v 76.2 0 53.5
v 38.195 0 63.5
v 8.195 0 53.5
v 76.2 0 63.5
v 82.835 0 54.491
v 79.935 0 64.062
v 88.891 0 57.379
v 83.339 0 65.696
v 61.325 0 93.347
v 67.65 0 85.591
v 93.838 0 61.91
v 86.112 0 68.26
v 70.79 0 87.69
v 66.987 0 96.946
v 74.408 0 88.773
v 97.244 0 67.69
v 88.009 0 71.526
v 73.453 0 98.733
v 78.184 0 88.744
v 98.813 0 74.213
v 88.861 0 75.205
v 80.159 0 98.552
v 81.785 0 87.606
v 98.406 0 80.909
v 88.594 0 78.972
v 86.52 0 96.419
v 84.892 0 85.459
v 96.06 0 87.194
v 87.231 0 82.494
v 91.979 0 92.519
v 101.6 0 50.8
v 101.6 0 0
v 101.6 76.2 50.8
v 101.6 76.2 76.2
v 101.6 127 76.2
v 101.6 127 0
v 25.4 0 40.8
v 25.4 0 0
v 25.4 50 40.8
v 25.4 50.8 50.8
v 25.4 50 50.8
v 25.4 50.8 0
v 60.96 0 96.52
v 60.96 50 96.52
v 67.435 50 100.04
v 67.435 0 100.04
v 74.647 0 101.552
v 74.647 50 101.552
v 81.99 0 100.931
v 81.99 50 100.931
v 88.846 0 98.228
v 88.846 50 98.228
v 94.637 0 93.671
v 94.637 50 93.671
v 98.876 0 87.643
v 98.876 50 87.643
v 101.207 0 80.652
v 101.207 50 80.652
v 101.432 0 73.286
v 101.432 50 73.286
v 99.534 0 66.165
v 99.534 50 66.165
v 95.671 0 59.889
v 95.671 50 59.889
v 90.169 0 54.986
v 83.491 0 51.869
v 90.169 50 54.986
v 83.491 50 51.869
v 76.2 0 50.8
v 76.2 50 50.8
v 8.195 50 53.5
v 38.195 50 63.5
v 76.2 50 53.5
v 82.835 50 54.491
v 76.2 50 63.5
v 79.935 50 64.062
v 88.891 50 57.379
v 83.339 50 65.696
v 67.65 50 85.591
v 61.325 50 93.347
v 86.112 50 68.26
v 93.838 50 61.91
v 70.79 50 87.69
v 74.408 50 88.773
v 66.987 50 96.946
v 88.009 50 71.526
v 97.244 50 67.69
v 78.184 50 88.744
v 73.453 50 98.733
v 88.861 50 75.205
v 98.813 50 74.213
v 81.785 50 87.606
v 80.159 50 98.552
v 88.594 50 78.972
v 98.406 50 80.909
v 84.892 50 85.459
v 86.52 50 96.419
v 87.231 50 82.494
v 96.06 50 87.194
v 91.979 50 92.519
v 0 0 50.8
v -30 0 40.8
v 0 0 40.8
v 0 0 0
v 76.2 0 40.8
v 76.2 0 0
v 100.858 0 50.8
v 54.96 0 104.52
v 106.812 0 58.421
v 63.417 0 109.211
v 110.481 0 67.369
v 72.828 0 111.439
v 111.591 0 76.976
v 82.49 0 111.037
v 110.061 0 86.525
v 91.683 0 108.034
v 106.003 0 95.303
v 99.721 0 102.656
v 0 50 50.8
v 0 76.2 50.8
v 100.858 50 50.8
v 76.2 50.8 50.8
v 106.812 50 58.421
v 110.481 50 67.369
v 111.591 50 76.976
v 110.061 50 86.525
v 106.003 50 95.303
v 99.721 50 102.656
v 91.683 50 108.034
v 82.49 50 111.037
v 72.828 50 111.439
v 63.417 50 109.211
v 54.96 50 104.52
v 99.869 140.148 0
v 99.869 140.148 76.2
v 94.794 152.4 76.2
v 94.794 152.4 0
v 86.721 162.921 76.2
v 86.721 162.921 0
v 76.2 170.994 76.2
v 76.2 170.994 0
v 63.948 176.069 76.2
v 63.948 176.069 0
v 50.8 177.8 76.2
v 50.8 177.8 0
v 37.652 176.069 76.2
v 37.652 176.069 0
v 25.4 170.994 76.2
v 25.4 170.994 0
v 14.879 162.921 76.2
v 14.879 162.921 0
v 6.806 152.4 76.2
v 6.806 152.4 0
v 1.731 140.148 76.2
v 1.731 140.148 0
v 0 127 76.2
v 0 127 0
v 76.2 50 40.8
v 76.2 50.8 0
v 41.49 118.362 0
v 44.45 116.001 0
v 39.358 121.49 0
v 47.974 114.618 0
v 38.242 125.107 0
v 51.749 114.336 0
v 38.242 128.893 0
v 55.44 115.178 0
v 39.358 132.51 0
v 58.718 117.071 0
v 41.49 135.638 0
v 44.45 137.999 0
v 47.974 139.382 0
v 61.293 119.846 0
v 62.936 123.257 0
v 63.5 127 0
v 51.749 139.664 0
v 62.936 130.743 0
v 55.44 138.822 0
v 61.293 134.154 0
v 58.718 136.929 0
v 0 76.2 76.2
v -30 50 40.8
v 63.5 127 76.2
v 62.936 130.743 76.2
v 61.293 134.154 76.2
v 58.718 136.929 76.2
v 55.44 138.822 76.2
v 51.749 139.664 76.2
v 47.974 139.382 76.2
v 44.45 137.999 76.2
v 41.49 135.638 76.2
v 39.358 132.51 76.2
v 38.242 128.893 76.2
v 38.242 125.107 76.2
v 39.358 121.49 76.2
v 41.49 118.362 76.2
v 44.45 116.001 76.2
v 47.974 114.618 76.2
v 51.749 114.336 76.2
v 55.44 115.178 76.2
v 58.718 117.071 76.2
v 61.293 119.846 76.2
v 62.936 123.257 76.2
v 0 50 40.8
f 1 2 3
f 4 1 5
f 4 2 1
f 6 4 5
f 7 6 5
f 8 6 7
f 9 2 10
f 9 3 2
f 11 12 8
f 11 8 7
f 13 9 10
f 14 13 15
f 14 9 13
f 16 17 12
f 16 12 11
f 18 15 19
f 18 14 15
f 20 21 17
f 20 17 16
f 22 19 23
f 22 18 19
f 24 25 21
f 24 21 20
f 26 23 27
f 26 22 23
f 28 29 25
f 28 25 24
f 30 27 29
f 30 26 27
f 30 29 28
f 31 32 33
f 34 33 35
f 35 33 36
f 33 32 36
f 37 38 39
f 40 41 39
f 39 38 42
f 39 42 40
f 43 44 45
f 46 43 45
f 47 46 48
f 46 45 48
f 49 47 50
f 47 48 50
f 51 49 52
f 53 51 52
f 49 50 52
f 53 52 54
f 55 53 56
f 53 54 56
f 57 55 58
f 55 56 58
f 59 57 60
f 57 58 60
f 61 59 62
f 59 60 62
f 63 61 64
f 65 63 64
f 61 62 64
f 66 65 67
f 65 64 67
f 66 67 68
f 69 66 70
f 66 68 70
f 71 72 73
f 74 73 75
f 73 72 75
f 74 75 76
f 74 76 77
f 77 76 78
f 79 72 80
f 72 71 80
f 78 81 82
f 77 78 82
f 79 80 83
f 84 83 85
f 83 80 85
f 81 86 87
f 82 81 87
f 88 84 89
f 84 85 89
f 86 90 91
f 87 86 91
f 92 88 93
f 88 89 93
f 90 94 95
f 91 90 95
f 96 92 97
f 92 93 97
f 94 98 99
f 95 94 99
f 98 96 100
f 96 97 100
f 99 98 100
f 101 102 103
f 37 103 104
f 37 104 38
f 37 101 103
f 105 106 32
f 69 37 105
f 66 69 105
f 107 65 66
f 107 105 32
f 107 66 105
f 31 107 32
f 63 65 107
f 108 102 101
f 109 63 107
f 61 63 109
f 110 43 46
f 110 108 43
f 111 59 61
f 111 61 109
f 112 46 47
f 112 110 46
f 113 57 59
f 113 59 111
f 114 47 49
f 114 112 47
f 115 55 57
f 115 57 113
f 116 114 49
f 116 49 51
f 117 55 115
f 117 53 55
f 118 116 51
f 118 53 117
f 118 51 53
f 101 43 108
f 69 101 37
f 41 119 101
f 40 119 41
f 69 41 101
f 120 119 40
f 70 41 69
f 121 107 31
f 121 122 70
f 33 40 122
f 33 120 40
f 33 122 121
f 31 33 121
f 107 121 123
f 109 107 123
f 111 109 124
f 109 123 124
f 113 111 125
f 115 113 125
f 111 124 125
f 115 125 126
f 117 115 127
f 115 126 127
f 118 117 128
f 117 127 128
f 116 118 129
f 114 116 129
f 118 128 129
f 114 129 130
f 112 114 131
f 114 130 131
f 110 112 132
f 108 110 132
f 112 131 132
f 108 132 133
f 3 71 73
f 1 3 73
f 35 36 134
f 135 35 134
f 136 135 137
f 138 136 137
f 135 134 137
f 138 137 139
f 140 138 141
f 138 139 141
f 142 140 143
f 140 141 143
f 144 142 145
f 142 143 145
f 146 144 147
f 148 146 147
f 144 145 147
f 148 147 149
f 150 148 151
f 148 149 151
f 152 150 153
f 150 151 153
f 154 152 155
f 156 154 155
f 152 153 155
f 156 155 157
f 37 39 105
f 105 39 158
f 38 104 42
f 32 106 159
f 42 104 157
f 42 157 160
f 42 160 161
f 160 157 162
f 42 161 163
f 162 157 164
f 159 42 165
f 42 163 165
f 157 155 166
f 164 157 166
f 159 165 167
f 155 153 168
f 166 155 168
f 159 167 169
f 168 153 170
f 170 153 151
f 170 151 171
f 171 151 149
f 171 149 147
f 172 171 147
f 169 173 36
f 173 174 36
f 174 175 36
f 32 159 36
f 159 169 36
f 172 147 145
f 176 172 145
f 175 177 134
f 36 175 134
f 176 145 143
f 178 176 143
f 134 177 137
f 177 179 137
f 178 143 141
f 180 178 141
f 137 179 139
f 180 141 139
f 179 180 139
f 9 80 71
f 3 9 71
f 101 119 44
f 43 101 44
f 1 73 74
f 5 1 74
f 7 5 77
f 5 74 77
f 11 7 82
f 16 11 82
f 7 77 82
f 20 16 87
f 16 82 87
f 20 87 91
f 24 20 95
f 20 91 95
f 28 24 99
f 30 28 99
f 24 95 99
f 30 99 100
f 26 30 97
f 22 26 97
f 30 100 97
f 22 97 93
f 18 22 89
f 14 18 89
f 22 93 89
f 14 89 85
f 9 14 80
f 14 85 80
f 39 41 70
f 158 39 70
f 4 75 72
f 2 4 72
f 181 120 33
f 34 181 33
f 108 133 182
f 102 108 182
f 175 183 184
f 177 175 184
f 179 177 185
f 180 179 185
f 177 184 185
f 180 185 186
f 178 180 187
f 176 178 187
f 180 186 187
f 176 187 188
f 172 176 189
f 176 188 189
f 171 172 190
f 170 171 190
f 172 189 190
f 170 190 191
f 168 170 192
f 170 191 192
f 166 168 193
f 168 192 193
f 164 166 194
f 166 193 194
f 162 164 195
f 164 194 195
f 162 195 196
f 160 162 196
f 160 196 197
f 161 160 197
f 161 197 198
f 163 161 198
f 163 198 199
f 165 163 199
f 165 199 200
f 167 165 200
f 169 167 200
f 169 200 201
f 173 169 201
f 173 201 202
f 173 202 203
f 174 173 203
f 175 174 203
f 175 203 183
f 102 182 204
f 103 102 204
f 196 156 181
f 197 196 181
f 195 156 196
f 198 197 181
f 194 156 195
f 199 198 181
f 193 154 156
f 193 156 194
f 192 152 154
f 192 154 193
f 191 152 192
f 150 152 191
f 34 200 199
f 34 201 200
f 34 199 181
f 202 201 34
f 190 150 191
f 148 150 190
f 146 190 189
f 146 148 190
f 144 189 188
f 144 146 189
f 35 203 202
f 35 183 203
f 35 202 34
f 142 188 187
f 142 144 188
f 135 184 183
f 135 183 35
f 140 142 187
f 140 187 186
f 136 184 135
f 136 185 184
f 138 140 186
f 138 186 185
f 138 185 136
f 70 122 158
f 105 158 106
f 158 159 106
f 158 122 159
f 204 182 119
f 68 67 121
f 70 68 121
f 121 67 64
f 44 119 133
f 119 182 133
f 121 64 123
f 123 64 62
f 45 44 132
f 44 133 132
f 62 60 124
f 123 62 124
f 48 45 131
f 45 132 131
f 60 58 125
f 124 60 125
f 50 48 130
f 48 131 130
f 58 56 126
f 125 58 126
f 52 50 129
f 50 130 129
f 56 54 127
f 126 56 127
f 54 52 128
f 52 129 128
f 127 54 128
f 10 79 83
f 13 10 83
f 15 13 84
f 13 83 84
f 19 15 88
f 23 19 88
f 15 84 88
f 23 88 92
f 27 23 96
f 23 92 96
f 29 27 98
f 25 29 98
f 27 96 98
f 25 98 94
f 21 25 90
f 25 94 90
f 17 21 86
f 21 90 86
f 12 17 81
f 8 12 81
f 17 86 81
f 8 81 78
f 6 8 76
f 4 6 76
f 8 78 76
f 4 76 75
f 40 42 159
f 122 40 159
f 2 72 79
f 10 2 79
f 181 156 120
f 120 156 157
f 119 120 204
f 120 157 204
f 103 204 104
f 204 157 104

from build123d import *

# Parameters (mm, degrees)
BOSS_EXTRUDE2_DEPTH      = 50.8
BOSS_EXTRUDE3_DEPTH      = 25.4
SKETCH4_R                = 12.7
CUT_EXTRUDE2_DEPTH       = 219.499061783
EXTRUDE_THIN14_START     = -50
EXTRUDE_THIN14_OUTLINE_W = 50.8
EXTRUDE_THIN14_OUTLINE_H = 10
EXTRUDE_THIN14_DEPTH     = 50


# Read off the part's stored shape, not the designer's step: Extrude-Thin14
with BuildPart() as part:
    # Sketch1 → Boss-Extrude2 (new body)
    with BuildSketch(Plane.XY):
        with BuildLine():
            Line((0, 127), (0, 0))
            Line((0, 0), (25.4, 0))
            Line((25.4, 0), (25.4, 50.8))
            Line((25.4, 50.8), (76.2, 50.8))
            Line((76.2, 50.8), (76.2, 0))
            Line((76.2, 0), (101.6, 0))
            Line((101.6, 0), (101.6, 127))
            ThreePointArc((101.6, 127), (50.8, 177.8), (0, 127))
        make_face()
    extrude(amount=BOSS_EXTRUDE2_DEPTH)

    # Sketch3 → Boss-Extrude3 (add)
    with BuildSketch(Plane.XY.offset(50.8)):
        with BuildLine():
            Line((0, 127), (0, 76.2))
            Line((0, 76.2), (101.6, 76.2))
            Line((101.6, 76.2), (101.6, 127))
            ThreePointArc((101.6, 127), (50.8, 177.8), (0, 127))
        make_face()
    extrude(amount=BOSS_EXTRUDE3_DEPTH)

    # Sketch4 → Cut-Extrude2 (cut, through all)
    with BuildSketch(Plane.XY.offset(76.2)):
        with Locations((50.8, 127)):
            Circle(SKETCH4_R)
    extrude(amount=-CUT_EXTRUDE2_DEPTH, mode=Mode.SUBTRACT)

    # Extrude-Thin14 outline → Extrude-Thin14 (add)
    # profile 1 of 3: a face of its own
    with BuildSketch(Plane.XZ.offset(EXTRUDE_THIN14_START)):
        with BuildLine():
            Line((8.195486321, 53.5), (76.2, 53.5))
            ThreePointArc((76.2, 53.5), (97.466516312, 84.138846513), (61.324968382, 93.347111546))
            Line((61.324968382, 93.347111546), (8.195486321, 53.5))
        make_face()
        with BuildLine():
            ThreePointArc((67.650406883, 85.591190422), (88.043946098, 80.783769281), (76.2, 63.5))
            Line((76.2, 63.5), (38.195486321, 63.5))
            Line((38.195486321, 63.5), (67.650406883, 85.591190422))
        make_face(mode=Mode.SUBTRACT)
    # profile 2 of 3: a face of its own
    with BuildSketch(Plane.XZ.offset(EXTRUDE_THIN14_START)):
        with BuildLine():
            Line((76.2, 50.8), (100.857656012, 50.8))
            ThreePointArc((100.857656012, 50.8), (103.114302762, 99.195223566), (54.96, 104.52))
            Line((54.96, 104.52), (-30, 40.8))
            Line((-30, 40.8), (0, 40.8))
            Line((0, 40.8), (0, 50.8))
            Line((0, 50.8), (60.96, 96.52))
            ThreePointArc((60.96, 96.52), (100.29655577, 84.232185257), (76.2, 50.8))
        make_face()
    # profile 3 of 3: a face of its own
    with BuildSketch(Plane.XZ.offset(EXTRUDE_THIN14_START)):
        with Locations((50.8, 45.8)):
            Rectangle(EXTRUDE_THIN14_OUTLINE_W, EXTRUDE_THIN14_OUTLINE_H)
    extrude(amount=EXTRUDE_THIN14_DEPTH)


solid = part.part
